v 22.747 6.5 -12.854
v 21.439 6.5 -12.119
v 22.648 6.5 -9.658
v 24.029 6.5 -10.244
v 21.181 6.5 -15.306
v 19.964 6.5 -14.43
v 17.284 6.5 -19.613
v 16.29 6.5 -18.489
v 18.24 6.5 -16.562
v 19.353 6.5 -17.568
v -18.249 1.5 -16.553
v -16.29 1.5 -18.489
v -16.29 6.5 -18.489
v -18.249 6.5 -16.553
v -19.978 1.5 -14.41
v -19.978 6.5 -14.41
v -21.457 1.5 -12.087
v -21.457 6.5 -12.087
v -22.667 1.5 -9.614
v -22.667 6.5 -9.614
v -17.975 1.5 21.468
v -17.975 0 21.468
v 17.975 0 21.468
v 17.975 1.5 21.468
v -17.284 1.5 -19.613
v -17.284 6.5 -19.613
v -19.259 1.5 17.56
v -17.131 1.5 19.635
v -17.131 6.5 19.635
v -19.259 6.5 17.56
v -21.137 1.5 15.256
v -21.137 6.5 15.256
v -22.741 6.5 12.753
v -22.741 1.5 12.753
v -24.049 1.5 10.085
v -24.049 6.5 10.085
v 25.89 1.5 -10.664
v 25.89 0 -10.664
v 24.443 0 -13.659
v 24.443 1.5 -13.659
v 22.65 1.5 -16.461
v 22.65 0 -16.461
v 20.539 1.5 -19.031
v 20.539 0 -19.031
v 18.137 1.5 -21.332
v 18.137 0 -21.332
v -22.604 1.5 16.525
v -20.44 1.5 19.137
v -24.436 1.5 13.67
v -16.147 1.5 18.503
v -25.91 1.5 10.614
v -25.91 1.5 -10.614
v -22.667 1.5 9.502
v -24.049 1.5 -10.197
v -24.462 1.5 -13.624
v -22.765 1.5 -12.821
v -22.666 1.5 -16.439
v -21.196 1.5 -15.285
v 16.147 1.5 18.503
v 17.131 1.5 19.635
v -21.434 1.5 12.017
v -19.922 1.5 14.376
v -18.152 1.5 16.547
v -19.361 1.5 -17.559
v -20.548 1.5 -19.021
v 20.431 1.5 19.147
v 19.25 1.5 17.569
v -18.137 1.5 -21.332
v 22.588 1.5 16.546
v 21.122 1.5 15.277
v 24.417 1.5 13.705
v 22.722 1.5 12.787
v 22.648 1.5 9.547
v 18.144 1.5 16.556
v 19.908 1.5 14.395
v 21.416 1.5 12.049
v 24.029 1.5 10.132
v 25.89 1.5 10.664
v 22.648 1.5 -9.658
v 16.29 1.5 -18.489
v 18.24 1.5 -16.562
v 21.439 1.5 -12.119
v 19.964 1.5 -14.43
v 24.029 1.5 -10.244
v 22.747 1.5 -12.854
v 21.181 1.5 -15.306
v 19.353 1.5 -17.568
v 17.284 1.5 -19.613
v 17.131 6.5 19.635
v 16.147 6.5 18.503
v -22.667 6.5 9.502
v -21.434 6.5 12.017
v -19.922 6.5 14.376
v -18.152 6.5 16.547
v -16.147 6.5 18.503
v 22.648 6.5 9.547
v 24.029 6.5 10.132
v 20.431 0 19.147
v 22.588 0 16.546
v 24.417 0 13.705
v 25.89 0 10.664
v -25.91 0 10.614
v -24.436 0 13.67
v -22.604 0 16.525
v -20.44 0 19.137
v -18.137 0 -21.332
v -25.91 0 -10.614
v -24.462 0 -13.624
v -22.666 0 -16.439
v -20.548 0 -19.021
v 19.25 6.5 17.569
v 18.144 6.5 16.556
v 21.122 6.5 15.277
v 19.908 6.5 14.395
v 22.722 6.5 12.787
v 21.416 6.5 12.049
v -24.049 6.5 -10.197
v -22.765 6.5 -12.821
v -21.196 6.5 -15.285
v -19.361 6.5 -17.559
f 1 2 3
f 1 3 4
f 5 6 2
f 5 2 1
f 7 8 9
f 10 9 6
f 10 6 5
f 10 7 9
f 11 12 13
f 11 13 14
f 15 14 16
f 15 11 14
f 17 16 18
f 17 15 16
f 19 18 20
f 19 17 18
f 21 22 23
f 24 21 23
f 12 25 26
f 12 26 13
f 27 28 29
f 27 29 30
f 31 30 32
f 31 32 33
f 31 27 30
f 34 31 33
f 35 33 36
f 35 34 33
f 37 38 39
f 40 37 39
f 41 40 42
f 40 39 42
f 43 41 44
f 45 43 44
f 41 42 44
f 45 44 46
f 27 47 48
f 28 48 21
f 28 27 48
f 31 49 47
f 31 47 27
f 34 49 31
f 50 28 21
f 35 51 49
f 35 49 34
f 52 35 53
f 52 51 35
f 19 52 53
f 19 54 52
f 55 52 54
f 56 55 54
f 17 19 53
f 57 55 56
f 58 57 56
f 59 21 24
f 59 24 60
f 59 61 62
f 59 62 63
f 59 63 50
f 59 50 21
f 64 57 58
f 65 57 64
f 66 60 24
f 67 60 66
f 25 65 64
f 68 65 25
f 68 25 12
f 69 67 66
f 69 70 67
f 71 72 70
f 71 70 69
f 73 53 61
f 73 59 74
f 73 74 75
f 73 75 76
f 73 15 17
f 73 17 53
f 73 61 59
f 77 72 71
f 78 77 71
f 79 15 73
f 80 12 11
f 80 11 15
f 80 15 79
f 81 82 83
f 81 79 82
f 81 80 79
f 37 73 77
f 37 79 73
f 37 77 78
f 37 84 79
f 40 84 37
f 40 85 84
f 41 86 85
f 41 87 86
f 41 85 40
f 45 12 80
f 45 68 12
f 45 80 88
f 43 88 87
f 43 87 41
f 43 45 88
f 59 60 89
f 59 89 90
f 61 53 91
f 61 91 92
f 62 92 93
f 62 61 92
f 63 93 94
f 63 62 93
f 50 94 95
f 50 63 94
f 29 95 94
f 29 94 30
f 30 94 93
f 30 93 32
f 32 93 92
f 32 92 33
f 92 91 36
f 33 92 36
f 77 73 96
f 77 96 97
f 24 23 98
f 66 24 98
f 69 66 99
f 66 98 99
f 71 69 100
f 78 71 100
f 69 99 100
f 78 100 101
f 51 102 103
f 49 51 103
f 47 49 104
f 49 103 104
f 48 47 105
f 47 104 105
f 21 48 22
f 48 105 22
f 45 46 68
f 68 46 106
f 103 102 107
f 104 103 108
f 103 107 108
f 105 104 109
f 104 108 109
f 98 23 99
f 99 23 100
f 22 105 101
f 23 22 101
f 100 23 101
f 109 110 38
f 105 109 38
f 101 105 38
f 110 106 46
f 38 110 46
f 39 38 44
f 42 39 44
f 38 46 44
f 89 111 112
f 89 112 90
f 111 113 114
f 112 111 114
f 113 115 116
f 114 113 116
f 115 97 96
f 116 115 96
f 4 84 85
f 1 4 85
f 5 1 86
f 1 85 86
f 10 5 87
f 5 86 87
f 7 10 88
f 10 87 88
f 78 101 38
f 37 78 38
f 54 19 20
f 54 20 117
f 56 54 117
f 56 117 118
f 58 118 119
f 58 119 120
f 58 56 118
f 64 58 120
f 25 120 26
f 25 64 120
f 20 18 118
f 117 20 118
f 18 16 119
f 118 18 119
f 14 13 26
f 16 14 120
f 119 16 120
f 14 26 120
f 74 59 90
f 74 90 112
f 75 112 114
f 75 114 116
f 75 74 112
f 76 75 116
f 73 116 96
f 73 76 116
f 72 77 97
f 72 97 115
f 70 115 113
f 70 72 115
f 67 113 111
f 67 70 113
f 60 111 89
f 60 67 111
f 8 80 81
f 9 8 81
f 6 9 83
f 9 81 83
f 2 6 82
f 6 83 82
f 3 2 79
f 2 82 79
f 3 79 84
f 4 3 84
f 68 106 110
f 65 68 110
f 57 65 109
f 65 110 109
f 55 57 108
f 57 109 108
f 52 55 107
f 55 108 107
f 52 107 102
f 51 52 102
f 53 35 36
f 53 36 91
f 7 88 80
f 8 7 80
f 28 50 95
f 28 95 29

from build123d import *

# Parameters (mm, degrees)
BOSS_EXTRUDE1_DEPTH = 1.5
BOSS_EXTRUDE2_DEPTH = 5


with BuildPart() as part:
    # Sketch1 → Boss-Extrude1 (new body)
    with BuildSketch(Plane(origin=(0, 0, 0), x_dir=(1, 0, 0), z_dir=(0, 1, 0))):
        with BuildLine():
            Line((-25.910177173, 10.614269588), (-25.910177173, -10.614269588))
            ThreePointArc((-25.910177173, -10.614269588), (-22.603967361, -16.524547181), (-17.975471458, -21.468172392))
            Line((-17.975471458, -21.468172392), (17.975471458, -21.468172392))
            ThreePointArc((17.975471458, -21.468172392), (22.588149859, -16.546162273), (25.889822827, -10.663820796))
            Line((25.889822827, -10.663820796), (25.889822827, 10.663820796))
            ThreePointArc((25.889822827, 10.663820796), (22.650459328, 16.460762201), (18.137065113, 21.331827608))
            Line((18.137065113, 21.331827608), (-18.137065113, 21.331827608))
            ThreePointArc((-18.137065113, 21.331827608), (-22.666195109, 16.439087544), (-25.910177173, 10.614269588))
        make_face()
    extrude(amount=BOSS_EXTRUDE1_DEPTH)

    # Sketch2 → Boss-Extrude2 (add)
    with BuildSketch(Plane(origin=(0, 1.5, 0), x_dir=(1, 0, 0), z_dir=(0, 1, 0))):
        with BuildLine():
            Line((-17.283724515, 19.613012201), (-16.290407014, 18.48903696))
            ThreePointArc((-16.290407014, 18.48903696), (-19.977953658, 14.409984138), (-22.667306708, 9.613730147))
            Line((-22.667306708, 9.613730147), (-24.049459557, 10.196528143))
            ThreePointArc((-24.049459557, 10.196528143), (-21.196121564, 15.285236646), (-17.283724515, 19.613012201))
        make_face()
        with BuildLine():
            Line((17.283724515, 19.613012201), (16.290407014, 18.48903696))
            ThreePointArc((16.290407014, 18.48903696), (19.963841864, 14.42960445), (22.648482765, 9.658250436))
            Line((22.648482765, 9.658250436), (24.029487812, 10.243763084))
            ThreePointArc((24.029487812, 10.243763084), (21.181149295, 15.306053319), (17.283724515, 19.613012201))
        make_face()
        with BuildLine():
            Line((22.648482765, -9.546564422), (24.029487812, -10.13207707))
            ThreePointArc((24.029487812, -10.13207707), (21.121707142, -15.276589528), (17.131154209, -19.635108099))
            Line((17.131154209, -19.635108099), (16.146605116, -18.503444243))
            ThreePointArc((16.146605116, -18.503444243), (19.907815927, -14.395415244), (22.648482765, -9.546564422))
        make_face()
        with BuildLine():
            Line((-24.049459557, -10.08484213), (-22.667306708, -9.502044133))
            ThreePointArc((-22.667306708, -9.502044133), (-19.922003884, -14.375849937), (-16.146605116, -18.503444243))
            Line((-16.146605116, -18.503444243), (-17.131154209, -19.635108099))
            ThreePointArc((-17.131154209, -19.635108099), (-21.136760219, -15.255831214), (-24.049459557, -10.08484213))
        make_face()
    extrude(amount=BOSS_EXTRUDE2_DEPTH)


solid = part.part
